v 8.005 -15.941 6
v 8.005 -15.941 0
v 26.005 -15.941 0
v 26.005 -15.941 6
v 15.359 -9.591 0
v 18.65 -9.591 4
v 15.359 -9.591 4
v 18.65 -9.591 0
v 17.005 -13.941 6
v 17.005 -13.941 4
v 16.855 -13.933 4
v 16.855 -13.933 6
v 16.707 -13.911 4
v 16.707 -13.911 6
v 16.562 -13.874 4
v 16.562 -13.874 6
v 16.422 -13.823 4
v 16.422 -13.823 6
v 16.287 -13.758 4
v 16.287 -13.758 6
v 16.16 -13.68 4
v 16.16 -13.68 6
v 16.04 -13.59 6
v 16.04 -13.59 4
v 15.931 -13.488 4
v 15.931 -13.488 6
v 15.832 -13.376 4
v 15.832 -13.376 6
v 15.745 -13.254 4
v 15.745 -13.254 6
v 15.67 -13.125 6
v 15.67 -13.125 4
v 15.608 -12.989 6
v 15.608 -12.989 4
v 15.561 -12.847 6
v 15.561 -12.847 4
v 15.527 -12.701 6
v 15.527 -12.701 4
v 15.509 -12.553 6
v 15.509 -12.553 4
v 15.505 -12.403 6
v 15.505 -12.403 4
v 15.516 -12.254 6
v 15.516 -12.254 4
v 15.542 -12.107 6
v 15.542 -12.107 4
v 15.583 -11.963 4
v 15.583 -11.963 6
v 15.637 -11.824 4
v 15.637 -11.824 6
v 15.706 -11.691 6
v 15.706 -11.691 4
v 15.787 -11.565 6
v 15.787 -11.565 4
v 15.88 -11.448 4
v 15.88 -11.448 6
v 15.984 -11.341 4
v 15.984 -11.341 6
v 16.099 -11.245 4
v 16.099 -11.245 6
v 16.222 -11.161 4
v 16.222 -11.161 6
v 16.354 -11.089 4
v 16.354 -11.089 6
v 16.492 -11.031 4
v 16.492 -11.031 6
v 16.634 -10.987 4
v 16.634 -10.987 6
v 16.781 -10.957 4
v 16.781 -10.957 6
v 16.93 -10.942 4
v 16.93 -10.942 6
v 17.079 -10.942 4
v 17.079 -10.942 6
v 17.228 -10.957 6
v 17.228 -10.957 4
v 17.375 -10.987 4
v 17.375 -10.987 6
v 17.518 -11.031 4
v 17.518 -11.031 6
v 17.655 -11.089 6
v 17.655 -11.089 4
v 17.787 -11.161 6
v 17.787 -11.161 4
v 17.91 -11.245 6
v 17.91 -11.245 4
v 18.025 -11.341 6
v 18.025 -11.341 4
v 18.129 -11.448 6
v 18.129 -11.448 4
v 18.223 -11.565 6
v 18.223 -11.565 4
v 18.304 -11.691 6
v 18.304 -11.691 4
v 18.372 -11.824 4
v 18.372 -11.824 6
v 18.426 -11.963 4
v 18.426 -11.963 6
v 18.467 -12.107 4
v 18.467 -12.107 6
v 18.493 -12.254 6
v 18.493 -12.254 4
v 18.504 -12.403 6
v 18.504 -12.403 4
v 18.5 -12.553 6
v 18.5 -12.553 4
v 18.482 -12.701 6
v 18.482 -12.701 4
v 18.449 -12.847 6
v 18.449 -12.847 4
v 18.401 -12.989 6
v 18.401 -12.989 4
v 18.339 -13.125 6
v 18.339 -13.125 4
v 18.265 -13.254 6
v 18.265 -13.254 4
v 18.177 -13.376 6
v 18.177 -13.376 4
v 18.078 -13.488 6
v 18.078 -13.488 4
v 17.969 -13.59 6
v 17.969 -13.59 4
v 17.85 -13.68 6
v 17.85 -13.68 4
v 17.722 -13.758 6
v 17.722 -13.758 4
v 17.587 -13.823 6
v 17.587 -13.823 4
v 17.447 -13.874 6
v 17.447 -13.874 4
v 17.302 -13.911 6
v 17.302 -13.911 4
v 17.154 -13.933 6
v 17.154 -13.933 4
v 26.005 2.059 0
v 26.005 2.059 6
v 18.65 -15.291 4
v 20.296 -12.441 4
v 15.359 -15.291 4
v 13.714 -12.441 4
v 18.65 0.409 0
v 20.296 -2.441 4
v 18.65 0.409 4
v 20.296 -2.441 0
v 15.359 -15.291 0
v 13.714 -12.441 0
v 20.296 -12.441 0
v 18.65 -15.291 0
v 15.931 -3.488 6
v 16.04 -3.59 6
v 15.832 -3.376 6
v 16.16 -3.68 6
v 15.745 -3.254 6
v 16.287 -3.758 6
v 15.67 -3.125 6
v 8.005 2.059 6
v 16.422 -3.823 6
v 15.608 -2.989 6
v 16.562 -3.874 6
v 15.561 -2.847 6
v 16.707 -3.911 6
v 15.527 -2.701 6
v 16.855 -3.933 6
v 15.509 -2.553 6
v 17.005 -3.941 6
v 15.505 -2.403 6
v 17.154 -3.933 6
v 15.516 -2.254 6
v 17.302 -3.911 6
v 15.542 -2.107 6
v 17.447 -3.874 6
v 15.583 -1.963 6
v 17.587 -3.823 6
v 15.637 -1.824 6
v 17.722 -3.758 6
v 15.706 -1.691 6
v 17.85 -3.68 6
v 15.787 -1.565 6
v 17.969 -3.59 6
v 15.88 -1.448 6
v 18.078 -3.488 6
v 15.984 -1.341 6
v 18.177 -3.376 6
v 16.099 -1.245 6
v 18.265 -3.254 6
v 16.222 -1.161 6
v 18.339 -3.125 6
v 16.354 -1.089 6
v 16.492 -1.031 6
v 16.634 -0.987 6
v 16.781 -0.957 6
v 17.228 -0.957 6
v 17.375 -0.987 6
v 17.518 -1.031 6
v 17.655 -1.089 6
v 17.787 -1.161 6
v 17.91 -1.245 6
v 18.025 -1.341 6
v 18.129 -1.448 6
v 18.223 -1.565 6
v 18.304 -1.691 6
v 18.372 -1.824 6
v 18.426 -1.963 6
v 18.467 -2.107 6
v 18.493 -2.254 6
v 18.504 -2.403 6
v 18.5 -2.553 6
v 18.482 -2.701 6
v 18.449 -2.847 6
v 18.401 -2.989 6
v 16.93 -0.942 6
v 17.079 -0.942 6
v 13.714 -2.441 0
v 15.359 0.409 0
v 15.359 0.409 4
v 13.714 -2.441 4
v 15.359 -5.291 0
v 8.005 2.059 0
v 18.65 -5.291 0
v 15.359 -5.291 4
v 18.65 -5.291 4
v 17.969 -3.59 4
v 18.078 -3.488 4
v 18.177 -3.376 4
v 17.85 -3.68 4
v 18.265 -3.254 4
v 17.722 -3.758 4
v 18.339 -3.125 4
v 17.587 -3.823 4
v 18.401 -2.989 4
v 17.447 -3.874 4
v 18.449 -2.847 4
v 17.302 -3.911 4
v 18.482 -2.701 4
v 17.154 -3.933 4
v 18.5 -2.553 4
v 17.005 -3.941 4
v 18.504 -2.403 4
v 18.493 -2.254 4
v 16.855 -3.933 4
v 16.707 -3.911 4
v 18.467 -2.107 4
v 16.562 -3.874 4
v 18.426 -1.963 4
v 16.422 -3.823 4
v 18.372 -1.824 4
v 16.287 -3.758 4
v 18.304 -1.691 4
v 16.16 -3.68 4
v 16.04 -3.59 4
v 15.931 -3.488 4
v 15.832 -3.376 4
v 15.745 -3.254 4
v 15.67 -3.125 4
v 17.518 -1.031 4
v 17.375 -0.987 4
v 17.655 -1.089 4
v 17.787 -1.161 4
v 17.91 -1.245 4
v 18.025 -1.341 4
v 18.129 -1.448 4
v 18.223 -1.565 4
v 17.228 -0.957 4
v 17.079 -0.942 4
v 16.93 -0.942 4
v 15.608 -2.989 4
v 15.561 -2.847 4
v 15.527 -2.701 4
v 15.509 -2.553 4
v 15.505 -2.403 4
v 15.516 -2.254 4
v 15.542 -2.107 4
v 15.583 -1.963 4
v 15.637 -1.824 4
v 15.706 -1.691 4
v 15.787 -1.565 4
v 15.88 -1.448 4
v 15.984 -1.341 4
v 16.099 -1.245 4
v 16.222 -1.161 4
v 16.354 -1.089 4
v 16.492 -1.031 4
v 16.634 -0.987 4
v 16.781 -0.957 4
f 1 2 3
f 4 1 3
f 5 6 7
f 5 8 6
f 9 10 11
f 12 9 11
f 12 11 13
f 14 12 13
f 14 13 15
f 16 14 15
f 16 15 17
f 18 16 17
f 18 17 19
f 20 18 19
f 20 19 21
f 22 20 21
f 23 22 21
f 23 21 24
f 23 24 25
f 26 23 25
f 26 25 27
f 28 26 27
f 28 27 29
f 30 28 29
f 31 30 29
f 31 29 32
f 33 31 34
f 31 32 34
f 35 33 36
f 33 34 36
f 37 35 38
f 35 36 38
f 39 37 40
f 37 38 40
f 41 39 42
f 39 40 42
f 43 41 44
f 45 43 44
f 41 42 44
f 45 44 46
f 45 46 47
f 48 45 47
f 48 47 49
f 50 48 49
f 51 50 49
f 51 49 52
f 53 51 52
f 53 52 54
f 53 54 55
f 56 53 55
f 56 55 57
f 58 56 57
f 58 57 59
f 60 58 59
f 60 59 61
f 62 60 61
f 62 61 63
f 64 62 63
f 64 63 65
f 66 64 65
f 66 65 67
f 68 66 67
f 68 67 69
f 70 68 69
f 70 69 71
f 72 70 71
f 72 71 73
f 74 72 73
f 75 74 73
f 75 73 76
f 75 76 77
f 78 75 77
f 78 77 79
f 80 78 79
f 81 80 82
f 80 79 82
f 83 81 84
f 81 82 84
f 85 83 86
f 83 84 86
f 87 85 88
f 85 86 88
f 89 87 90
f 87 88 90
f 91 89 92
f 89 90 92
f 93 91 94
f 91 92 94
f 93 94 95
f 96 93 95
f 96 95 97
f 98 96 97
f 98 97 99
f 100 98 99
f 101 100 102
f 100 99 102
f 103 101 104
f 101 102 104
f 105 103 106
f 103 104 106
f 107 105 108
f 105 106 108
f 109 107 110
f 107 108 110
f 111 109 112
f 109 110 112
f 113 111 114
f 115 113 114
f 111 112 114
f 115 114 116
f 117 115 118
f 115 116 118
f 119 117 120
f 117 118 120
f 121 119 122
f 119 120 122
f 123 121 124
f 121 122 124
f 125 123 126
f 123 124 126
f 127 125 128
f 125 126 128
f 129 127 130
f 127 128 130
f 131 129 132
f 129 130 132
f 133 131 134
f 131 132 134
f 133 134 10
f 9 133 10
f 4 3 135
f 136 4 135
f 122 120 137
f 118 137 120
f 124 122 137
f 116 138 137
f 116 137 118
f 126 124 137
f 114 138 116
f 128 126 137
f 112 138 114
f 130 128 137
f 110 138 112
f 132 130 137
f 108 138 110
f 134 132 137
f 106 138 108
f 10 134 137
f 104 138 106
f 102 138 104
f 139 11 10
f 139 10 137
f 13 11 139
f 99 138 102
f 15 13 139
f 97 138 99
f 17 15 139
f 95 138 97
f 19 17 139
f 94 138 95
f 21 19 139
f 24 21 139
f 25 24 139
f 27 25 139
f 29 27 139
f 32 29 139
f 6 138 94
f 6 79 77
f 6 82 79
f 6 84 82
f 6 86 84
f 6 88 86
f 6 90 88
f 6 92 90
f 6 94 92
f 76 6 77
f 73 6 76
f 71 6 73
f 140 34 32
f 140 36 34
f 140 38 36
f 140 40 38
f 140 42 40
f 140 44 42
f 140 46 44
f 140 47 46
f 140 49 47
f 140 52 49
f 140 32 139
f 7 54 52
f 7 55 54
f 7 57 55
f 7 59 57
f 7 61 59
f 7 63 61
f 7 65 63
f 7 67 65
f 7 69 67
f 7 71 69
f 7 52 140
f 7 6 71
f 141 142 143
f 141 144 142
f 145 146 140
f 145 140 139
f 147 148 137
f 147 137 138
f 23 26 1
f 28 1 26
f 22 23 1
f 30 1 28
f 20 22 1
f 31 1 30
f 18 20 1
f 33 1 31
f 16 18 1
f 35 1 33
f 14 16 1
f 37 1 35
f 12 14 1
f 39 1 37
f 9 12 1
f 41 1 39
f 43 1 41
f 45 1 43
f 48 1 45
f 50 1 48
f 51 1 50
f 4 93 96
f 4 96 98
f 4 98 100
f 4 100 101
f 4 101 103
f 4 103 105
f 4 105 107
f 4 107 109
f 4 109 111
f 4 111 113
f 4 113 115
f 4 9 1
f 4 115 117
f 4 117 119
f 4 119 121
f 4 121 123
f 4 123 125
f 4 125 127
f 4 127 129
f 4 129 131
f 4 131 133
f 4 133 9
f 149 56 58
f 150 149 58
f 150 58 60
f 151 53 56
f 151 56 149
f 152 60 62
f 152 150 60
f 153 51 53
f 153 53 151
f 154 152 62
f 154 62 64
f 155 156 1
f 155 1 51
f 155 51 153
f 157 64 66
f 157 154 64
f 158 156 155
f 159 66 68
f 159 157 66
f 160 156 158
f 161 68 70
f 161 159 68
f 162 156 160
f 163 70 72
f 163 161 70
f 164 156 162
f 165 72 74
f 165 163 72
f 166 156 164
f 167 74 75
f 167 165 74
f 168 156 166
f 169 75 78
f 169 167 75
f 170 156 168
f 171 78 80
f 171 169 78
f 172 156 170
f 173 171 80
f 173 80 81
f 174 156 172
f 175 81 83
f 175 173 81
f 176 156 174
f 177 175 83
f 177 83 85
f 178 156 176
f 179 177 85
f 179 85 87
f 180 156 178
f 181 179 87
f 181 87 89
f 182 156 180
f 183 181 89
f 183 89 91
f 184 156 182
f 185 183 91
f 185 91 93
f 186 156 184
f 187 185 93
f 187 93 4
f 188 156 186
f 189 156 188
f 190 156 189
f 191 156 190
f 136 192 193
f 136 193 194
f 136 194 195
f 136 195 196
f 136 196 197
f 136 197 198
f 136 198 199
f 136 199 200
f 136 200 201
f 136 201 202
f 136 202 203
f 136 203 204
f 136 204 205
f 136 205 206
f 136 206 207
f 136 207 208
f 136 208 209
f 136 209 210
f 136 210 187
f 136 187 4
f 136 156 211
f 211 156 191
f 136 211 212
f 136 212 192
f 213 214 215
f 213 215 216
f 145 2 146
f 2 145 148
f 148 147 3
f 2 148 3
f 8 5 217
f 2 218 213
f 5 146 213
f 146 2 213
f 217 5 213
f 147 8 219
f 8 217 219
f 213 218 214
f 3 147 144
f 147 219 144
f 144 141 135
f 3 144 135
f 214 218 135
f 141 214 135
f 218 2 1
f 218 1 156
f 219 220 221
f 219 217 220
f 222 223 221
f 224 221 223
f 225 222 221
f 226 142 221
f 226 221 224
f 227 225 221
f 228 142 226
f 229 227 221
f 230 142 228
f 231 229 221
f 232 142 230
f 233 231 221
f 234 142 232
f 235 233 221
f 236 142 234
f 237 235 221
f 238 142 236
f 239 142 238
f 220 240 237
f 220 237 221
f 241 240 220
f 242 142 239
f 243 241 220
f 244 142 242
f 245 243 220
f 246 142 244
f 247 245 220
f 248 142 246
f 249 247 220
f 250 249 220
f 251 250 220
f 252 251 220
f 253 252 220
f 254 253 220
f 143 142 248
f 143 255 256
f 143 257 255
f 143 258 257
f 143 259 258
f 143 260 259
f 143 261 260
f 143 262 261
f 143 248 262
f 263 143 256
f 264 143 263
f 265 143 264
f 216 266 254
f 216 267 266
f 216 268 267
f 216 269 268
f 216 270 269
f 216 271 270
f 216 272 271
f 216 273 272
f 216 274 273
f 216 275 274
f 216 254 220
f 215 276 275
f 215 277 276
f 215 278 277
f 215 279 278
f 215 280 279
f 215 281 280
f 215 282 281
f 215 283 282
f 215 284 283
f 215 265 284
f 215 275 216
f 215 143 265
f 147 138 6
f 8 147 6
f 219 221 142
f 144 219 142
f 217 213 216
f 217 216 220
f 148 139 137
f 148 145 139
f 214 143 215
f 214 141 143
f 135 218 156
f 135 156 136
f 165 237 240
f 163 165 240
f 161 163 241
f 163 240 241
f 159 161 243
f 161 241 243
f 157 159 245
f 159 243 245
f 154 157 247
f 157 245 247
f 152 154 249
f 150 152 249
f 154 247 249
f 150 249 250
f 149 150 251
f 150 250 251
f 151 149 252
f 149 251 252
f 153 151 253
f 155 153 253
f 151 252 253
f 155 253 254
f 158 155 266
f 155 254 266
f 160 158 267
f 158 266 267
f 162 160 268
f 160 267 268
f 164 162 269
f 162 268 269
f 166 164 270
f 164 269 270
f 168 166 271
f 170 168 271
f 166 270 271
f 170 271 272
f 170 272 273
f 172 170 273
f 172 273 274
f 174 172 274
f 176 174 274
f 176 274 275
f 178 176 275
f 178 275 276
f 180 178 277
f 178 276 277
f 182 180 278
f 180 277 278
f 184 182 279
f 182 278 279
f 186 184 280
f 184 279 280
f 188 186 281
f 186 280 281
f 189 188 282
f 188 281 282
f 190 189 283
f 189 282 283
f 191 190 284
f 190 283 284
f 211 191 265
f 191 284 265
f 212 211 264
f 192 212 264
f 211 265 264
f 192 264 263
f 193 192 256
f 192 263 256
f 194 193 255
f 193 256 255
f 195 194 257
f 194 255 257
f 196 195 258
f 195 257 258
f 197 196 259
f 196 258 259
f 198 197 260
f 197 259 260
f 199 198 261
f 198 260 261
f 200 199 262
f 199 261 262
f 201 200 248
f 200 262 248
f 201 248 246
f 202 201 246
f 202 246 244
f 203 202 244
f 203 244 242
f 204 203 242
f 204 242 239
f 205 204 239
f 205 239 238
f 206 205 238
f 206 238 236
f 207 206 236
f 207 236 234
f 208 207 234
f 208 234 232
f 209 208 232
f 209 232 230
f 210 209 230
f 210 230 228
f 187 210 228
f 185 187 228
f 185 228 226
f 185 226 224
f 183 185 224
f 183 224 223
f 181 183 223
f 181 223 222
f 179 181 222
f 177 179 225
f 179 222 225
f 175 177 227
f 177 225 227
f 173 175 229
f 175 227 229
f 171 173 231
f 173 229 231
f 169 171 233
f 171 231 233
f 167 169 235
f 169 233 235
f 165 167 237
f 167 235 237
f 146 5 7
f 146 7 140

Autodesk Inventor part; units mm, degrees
ref_plane "YZ Plane" through (0, 0, 0) normal (1, 0, 0) x (0, 1, 0)
ref_plane "XZ Plane" through (0, 0, 0) normal (0, 1, 0) x (-1, 0, 0)
ref_plane "XY Plane" through (0, 0, 0) normal (0, 0, 1) x (1, 0, 0)
ref_plane "Work Plane1" through (0, 0, 0) normal (0, 0, 1) x (1, 0, 0)
sketch "Sketch1" plane through (0, 0, 0) normal (0, 0, 1) x (1, 0, 0)
  arc A0 (-10.7354, 13.2764) -> (-8.7899, 5.3181) centre (6.5146, 13.2764) ccw projected
  line L0 (2.2646, -15.9406) -> (-8.7899, 5.3181) projected
  line L1 (2.2646, -15.9406) -> (17.0046, -15.9406) projected
  line L2 (17.0046, -15.9406) -> (17.0046, -1.0343) projected
  arc A1 (-5.2391, 19.424) -> (17.0046, -1.0343) centre (26.9358, 32.085) ccw projected
  arc A2 (-5.2391, 19.424) -> (-10.7354, 23.5341) centre (-10.7011, 17.8498) ccw projected
  line L3 (-10.7354, 23.5341) -> (-10.7354, 13.2764) projected
  line L4 (17.0046, -15.9406) -> (26.0046, -15.9406)
  line L5 (26.0046, -15.9406) -> (26.0046, 2.0594)
  line L6 (26.0046, 2.0594) -> (17.0046, 2.0594)
  line L7 (17.0046, 2.0594) -> (17.0046, -15.9406)
  line L8 (17.0046, -15.9406) -> (8.0046, -15.9406)
  line L9 (8.0046, -15.9406) -> (8.0046, 2.0594)
  line L10 (8.0046, 2.0594) -> (17.0046, 2.0594)
  line L11 (17.0046, 2.0594) -> (17.0046, -15.9406)
  point P0 (0, 0)
  dimension "d0" = 9
  dimension "d1" = 18
  dimension "d2" = 9
extrude "Extrusion1" add sketch "Sketch1" along normal blind 6 contours L9 L10 A1 L2 L1 | L10 L7 A1 | L2 L7 L6 L5 L4
sketch "Sketch2" plane through (0, 0, 6) normal (0, 0, 1) x (1, 0, 0)
  line L0 (26.0046, 2.0594) -> (8.0046, 2.0594) projected
  line L1 (8.0046, 2.0594) -> (8.0046, -15.9406) projected
  line L2 (8.0046, -15.9406) -> (26.0046, -15.9406) projected
  line L3 (26.0046, -15.9406) -> (26.0046, 2.0594) projected
  line L4 (17.0046, -15.9406) -> (17.0046, -12.4406) construction
  line L5 (17.0046, -12.4406) -> (17.0046, -2.4406) construction
  point P0 (0, 0)
  dimension "d5" = 3.5
  dimension "d6" = 10
hole "Hole1" at (17.0046, -12.4406, 6) at (17.0046, -2.4406, 6) direction (0, 0, -1) diameter 3 end through all
sketch "Sketch3" plane through (0, 0, 0) normal (0, 0, -1) x (-1, 0, 0)
  circle A0 centre (-17.0046, -12.4406) radius 1.5 projected
  circle A1 centre (-17.0046, -2.4406) radius 1.5 projected
  line L0 (-8.0046, -15.9406) -> (-26.0046, -15.9406) projected
  line L1 (-8.0046, 2.0594) -> (-8.0046, -15.9406) projected
  line L2 (-26.0046, 2.0594) -> (-8.0046, 2.0594) projected
  line L3 (-26.0046, -15.9406) -> (-26.0046, 2.0594) projected
  line L4 (-20.2955, -12.4406) -> (-18.65, -9.5906)
  line L5 (-18.65, -9.5906) -> (-15.3591, -9.5906)
  line L6 (-15.3591, -9.5906) -> (-13.7137, -12.4406)
  line L7 (-13.7137, -12.4406) -> (-15.3591, -15.2906)
  line L8 (-15.3591, -15.2906) -> (-18.65, -15.2906)
  line L9 (-18.65, -15.2906) -> (-20.2955, -12.4406)
  line L10 (-20.2955, -2.4406) -> (-18.65, 0.4094)
  line L11 (-18.65, 0.4094) -> (-15.3591, 0.4094)
  line L12 (-15.3591, 0.4094) -> (-13.7137, -2.4406)
  line L13 (-13.7137, -2.4406) -> (-15.3591, -5.2906)
  line L14 (-15.3591, -5.2906) -> (-18.65, -5.2906)
  line L15 (-18.65, -5.2906) -> (-20.2955, -2.4406)
  point P0 (0, 0)
  dimension "d14" = 5.7
ref_plane "Work Plane2" through (0, 0, 3.5) normal (0, 0, -1) x (-1, 0, 0)
sketch "Sketch4" plane through (0, 0, 3.5) normal (0, 0, -1) x (-1, 0, 0)
  line L0 (-18.65, 0.4094) -> (-15.3591, 0.4094) projected
  line L1 (-20.2955, -2.4406) -> (-18.65, 0.4094) projected
  circle A0 centre (-17.0046, -2.4406) radius 1.5 projected
  circle A1 centre (-17.0046, -12.4406) radius 1.5 projected
  line L2 (-15.3591, -5.2906) -> (-18.65, -5.2906) projected
  line L3 (-18.65, -9.5906) -> (-15.3591, -9.5906) projected
  line L4 (-20.2955, -12.4406) -> (-18.65, -9.5906) projected
  line L5 (-20.2955, -12.4406) -> (-18.65, -9.5906)
  line L6 (-18.65, -9.5906) -> (-15.3591, -9.5906)
  line L7 (-15.3591, -9.5906) -> (-13.7137, -12.4406)
  line L8 (-13.7137, -12.4406) -> (-15.3591, -15.2906)
  line L9 (-15.3591, -15.2906) -> (-18.65, -15.2906)
  line L10 (-18.65, -15.2906) -> (-20.2955, -12.4406)
  line L11 (-20.2955, -2.4406) -> (-18.65, 0.4094)
  line L12 (-18.65, 0.4094) -> (-15.3591, 0.4094)
  line L13 (-15.3591, 0.4094) -> (-13.7137, -2.4406)
  line L14 (-13.7137, -2.4406) -> (-15.3591, -5.2906)
  line L15 (-15.3591, -5.2906) -> (-18.65, -5.2906)
  line L16 (-18.65, -5.2906) -> (-20.2955, -2.4406)
  point P0 (0, 0)
extrude "Extrusion2" cut sketch "Sketch3" against normal blind 4 contours L4 L5 L6 L7 L8 L9 | L10 L11 L12 L13 L14 L15
properties part number "holder"
